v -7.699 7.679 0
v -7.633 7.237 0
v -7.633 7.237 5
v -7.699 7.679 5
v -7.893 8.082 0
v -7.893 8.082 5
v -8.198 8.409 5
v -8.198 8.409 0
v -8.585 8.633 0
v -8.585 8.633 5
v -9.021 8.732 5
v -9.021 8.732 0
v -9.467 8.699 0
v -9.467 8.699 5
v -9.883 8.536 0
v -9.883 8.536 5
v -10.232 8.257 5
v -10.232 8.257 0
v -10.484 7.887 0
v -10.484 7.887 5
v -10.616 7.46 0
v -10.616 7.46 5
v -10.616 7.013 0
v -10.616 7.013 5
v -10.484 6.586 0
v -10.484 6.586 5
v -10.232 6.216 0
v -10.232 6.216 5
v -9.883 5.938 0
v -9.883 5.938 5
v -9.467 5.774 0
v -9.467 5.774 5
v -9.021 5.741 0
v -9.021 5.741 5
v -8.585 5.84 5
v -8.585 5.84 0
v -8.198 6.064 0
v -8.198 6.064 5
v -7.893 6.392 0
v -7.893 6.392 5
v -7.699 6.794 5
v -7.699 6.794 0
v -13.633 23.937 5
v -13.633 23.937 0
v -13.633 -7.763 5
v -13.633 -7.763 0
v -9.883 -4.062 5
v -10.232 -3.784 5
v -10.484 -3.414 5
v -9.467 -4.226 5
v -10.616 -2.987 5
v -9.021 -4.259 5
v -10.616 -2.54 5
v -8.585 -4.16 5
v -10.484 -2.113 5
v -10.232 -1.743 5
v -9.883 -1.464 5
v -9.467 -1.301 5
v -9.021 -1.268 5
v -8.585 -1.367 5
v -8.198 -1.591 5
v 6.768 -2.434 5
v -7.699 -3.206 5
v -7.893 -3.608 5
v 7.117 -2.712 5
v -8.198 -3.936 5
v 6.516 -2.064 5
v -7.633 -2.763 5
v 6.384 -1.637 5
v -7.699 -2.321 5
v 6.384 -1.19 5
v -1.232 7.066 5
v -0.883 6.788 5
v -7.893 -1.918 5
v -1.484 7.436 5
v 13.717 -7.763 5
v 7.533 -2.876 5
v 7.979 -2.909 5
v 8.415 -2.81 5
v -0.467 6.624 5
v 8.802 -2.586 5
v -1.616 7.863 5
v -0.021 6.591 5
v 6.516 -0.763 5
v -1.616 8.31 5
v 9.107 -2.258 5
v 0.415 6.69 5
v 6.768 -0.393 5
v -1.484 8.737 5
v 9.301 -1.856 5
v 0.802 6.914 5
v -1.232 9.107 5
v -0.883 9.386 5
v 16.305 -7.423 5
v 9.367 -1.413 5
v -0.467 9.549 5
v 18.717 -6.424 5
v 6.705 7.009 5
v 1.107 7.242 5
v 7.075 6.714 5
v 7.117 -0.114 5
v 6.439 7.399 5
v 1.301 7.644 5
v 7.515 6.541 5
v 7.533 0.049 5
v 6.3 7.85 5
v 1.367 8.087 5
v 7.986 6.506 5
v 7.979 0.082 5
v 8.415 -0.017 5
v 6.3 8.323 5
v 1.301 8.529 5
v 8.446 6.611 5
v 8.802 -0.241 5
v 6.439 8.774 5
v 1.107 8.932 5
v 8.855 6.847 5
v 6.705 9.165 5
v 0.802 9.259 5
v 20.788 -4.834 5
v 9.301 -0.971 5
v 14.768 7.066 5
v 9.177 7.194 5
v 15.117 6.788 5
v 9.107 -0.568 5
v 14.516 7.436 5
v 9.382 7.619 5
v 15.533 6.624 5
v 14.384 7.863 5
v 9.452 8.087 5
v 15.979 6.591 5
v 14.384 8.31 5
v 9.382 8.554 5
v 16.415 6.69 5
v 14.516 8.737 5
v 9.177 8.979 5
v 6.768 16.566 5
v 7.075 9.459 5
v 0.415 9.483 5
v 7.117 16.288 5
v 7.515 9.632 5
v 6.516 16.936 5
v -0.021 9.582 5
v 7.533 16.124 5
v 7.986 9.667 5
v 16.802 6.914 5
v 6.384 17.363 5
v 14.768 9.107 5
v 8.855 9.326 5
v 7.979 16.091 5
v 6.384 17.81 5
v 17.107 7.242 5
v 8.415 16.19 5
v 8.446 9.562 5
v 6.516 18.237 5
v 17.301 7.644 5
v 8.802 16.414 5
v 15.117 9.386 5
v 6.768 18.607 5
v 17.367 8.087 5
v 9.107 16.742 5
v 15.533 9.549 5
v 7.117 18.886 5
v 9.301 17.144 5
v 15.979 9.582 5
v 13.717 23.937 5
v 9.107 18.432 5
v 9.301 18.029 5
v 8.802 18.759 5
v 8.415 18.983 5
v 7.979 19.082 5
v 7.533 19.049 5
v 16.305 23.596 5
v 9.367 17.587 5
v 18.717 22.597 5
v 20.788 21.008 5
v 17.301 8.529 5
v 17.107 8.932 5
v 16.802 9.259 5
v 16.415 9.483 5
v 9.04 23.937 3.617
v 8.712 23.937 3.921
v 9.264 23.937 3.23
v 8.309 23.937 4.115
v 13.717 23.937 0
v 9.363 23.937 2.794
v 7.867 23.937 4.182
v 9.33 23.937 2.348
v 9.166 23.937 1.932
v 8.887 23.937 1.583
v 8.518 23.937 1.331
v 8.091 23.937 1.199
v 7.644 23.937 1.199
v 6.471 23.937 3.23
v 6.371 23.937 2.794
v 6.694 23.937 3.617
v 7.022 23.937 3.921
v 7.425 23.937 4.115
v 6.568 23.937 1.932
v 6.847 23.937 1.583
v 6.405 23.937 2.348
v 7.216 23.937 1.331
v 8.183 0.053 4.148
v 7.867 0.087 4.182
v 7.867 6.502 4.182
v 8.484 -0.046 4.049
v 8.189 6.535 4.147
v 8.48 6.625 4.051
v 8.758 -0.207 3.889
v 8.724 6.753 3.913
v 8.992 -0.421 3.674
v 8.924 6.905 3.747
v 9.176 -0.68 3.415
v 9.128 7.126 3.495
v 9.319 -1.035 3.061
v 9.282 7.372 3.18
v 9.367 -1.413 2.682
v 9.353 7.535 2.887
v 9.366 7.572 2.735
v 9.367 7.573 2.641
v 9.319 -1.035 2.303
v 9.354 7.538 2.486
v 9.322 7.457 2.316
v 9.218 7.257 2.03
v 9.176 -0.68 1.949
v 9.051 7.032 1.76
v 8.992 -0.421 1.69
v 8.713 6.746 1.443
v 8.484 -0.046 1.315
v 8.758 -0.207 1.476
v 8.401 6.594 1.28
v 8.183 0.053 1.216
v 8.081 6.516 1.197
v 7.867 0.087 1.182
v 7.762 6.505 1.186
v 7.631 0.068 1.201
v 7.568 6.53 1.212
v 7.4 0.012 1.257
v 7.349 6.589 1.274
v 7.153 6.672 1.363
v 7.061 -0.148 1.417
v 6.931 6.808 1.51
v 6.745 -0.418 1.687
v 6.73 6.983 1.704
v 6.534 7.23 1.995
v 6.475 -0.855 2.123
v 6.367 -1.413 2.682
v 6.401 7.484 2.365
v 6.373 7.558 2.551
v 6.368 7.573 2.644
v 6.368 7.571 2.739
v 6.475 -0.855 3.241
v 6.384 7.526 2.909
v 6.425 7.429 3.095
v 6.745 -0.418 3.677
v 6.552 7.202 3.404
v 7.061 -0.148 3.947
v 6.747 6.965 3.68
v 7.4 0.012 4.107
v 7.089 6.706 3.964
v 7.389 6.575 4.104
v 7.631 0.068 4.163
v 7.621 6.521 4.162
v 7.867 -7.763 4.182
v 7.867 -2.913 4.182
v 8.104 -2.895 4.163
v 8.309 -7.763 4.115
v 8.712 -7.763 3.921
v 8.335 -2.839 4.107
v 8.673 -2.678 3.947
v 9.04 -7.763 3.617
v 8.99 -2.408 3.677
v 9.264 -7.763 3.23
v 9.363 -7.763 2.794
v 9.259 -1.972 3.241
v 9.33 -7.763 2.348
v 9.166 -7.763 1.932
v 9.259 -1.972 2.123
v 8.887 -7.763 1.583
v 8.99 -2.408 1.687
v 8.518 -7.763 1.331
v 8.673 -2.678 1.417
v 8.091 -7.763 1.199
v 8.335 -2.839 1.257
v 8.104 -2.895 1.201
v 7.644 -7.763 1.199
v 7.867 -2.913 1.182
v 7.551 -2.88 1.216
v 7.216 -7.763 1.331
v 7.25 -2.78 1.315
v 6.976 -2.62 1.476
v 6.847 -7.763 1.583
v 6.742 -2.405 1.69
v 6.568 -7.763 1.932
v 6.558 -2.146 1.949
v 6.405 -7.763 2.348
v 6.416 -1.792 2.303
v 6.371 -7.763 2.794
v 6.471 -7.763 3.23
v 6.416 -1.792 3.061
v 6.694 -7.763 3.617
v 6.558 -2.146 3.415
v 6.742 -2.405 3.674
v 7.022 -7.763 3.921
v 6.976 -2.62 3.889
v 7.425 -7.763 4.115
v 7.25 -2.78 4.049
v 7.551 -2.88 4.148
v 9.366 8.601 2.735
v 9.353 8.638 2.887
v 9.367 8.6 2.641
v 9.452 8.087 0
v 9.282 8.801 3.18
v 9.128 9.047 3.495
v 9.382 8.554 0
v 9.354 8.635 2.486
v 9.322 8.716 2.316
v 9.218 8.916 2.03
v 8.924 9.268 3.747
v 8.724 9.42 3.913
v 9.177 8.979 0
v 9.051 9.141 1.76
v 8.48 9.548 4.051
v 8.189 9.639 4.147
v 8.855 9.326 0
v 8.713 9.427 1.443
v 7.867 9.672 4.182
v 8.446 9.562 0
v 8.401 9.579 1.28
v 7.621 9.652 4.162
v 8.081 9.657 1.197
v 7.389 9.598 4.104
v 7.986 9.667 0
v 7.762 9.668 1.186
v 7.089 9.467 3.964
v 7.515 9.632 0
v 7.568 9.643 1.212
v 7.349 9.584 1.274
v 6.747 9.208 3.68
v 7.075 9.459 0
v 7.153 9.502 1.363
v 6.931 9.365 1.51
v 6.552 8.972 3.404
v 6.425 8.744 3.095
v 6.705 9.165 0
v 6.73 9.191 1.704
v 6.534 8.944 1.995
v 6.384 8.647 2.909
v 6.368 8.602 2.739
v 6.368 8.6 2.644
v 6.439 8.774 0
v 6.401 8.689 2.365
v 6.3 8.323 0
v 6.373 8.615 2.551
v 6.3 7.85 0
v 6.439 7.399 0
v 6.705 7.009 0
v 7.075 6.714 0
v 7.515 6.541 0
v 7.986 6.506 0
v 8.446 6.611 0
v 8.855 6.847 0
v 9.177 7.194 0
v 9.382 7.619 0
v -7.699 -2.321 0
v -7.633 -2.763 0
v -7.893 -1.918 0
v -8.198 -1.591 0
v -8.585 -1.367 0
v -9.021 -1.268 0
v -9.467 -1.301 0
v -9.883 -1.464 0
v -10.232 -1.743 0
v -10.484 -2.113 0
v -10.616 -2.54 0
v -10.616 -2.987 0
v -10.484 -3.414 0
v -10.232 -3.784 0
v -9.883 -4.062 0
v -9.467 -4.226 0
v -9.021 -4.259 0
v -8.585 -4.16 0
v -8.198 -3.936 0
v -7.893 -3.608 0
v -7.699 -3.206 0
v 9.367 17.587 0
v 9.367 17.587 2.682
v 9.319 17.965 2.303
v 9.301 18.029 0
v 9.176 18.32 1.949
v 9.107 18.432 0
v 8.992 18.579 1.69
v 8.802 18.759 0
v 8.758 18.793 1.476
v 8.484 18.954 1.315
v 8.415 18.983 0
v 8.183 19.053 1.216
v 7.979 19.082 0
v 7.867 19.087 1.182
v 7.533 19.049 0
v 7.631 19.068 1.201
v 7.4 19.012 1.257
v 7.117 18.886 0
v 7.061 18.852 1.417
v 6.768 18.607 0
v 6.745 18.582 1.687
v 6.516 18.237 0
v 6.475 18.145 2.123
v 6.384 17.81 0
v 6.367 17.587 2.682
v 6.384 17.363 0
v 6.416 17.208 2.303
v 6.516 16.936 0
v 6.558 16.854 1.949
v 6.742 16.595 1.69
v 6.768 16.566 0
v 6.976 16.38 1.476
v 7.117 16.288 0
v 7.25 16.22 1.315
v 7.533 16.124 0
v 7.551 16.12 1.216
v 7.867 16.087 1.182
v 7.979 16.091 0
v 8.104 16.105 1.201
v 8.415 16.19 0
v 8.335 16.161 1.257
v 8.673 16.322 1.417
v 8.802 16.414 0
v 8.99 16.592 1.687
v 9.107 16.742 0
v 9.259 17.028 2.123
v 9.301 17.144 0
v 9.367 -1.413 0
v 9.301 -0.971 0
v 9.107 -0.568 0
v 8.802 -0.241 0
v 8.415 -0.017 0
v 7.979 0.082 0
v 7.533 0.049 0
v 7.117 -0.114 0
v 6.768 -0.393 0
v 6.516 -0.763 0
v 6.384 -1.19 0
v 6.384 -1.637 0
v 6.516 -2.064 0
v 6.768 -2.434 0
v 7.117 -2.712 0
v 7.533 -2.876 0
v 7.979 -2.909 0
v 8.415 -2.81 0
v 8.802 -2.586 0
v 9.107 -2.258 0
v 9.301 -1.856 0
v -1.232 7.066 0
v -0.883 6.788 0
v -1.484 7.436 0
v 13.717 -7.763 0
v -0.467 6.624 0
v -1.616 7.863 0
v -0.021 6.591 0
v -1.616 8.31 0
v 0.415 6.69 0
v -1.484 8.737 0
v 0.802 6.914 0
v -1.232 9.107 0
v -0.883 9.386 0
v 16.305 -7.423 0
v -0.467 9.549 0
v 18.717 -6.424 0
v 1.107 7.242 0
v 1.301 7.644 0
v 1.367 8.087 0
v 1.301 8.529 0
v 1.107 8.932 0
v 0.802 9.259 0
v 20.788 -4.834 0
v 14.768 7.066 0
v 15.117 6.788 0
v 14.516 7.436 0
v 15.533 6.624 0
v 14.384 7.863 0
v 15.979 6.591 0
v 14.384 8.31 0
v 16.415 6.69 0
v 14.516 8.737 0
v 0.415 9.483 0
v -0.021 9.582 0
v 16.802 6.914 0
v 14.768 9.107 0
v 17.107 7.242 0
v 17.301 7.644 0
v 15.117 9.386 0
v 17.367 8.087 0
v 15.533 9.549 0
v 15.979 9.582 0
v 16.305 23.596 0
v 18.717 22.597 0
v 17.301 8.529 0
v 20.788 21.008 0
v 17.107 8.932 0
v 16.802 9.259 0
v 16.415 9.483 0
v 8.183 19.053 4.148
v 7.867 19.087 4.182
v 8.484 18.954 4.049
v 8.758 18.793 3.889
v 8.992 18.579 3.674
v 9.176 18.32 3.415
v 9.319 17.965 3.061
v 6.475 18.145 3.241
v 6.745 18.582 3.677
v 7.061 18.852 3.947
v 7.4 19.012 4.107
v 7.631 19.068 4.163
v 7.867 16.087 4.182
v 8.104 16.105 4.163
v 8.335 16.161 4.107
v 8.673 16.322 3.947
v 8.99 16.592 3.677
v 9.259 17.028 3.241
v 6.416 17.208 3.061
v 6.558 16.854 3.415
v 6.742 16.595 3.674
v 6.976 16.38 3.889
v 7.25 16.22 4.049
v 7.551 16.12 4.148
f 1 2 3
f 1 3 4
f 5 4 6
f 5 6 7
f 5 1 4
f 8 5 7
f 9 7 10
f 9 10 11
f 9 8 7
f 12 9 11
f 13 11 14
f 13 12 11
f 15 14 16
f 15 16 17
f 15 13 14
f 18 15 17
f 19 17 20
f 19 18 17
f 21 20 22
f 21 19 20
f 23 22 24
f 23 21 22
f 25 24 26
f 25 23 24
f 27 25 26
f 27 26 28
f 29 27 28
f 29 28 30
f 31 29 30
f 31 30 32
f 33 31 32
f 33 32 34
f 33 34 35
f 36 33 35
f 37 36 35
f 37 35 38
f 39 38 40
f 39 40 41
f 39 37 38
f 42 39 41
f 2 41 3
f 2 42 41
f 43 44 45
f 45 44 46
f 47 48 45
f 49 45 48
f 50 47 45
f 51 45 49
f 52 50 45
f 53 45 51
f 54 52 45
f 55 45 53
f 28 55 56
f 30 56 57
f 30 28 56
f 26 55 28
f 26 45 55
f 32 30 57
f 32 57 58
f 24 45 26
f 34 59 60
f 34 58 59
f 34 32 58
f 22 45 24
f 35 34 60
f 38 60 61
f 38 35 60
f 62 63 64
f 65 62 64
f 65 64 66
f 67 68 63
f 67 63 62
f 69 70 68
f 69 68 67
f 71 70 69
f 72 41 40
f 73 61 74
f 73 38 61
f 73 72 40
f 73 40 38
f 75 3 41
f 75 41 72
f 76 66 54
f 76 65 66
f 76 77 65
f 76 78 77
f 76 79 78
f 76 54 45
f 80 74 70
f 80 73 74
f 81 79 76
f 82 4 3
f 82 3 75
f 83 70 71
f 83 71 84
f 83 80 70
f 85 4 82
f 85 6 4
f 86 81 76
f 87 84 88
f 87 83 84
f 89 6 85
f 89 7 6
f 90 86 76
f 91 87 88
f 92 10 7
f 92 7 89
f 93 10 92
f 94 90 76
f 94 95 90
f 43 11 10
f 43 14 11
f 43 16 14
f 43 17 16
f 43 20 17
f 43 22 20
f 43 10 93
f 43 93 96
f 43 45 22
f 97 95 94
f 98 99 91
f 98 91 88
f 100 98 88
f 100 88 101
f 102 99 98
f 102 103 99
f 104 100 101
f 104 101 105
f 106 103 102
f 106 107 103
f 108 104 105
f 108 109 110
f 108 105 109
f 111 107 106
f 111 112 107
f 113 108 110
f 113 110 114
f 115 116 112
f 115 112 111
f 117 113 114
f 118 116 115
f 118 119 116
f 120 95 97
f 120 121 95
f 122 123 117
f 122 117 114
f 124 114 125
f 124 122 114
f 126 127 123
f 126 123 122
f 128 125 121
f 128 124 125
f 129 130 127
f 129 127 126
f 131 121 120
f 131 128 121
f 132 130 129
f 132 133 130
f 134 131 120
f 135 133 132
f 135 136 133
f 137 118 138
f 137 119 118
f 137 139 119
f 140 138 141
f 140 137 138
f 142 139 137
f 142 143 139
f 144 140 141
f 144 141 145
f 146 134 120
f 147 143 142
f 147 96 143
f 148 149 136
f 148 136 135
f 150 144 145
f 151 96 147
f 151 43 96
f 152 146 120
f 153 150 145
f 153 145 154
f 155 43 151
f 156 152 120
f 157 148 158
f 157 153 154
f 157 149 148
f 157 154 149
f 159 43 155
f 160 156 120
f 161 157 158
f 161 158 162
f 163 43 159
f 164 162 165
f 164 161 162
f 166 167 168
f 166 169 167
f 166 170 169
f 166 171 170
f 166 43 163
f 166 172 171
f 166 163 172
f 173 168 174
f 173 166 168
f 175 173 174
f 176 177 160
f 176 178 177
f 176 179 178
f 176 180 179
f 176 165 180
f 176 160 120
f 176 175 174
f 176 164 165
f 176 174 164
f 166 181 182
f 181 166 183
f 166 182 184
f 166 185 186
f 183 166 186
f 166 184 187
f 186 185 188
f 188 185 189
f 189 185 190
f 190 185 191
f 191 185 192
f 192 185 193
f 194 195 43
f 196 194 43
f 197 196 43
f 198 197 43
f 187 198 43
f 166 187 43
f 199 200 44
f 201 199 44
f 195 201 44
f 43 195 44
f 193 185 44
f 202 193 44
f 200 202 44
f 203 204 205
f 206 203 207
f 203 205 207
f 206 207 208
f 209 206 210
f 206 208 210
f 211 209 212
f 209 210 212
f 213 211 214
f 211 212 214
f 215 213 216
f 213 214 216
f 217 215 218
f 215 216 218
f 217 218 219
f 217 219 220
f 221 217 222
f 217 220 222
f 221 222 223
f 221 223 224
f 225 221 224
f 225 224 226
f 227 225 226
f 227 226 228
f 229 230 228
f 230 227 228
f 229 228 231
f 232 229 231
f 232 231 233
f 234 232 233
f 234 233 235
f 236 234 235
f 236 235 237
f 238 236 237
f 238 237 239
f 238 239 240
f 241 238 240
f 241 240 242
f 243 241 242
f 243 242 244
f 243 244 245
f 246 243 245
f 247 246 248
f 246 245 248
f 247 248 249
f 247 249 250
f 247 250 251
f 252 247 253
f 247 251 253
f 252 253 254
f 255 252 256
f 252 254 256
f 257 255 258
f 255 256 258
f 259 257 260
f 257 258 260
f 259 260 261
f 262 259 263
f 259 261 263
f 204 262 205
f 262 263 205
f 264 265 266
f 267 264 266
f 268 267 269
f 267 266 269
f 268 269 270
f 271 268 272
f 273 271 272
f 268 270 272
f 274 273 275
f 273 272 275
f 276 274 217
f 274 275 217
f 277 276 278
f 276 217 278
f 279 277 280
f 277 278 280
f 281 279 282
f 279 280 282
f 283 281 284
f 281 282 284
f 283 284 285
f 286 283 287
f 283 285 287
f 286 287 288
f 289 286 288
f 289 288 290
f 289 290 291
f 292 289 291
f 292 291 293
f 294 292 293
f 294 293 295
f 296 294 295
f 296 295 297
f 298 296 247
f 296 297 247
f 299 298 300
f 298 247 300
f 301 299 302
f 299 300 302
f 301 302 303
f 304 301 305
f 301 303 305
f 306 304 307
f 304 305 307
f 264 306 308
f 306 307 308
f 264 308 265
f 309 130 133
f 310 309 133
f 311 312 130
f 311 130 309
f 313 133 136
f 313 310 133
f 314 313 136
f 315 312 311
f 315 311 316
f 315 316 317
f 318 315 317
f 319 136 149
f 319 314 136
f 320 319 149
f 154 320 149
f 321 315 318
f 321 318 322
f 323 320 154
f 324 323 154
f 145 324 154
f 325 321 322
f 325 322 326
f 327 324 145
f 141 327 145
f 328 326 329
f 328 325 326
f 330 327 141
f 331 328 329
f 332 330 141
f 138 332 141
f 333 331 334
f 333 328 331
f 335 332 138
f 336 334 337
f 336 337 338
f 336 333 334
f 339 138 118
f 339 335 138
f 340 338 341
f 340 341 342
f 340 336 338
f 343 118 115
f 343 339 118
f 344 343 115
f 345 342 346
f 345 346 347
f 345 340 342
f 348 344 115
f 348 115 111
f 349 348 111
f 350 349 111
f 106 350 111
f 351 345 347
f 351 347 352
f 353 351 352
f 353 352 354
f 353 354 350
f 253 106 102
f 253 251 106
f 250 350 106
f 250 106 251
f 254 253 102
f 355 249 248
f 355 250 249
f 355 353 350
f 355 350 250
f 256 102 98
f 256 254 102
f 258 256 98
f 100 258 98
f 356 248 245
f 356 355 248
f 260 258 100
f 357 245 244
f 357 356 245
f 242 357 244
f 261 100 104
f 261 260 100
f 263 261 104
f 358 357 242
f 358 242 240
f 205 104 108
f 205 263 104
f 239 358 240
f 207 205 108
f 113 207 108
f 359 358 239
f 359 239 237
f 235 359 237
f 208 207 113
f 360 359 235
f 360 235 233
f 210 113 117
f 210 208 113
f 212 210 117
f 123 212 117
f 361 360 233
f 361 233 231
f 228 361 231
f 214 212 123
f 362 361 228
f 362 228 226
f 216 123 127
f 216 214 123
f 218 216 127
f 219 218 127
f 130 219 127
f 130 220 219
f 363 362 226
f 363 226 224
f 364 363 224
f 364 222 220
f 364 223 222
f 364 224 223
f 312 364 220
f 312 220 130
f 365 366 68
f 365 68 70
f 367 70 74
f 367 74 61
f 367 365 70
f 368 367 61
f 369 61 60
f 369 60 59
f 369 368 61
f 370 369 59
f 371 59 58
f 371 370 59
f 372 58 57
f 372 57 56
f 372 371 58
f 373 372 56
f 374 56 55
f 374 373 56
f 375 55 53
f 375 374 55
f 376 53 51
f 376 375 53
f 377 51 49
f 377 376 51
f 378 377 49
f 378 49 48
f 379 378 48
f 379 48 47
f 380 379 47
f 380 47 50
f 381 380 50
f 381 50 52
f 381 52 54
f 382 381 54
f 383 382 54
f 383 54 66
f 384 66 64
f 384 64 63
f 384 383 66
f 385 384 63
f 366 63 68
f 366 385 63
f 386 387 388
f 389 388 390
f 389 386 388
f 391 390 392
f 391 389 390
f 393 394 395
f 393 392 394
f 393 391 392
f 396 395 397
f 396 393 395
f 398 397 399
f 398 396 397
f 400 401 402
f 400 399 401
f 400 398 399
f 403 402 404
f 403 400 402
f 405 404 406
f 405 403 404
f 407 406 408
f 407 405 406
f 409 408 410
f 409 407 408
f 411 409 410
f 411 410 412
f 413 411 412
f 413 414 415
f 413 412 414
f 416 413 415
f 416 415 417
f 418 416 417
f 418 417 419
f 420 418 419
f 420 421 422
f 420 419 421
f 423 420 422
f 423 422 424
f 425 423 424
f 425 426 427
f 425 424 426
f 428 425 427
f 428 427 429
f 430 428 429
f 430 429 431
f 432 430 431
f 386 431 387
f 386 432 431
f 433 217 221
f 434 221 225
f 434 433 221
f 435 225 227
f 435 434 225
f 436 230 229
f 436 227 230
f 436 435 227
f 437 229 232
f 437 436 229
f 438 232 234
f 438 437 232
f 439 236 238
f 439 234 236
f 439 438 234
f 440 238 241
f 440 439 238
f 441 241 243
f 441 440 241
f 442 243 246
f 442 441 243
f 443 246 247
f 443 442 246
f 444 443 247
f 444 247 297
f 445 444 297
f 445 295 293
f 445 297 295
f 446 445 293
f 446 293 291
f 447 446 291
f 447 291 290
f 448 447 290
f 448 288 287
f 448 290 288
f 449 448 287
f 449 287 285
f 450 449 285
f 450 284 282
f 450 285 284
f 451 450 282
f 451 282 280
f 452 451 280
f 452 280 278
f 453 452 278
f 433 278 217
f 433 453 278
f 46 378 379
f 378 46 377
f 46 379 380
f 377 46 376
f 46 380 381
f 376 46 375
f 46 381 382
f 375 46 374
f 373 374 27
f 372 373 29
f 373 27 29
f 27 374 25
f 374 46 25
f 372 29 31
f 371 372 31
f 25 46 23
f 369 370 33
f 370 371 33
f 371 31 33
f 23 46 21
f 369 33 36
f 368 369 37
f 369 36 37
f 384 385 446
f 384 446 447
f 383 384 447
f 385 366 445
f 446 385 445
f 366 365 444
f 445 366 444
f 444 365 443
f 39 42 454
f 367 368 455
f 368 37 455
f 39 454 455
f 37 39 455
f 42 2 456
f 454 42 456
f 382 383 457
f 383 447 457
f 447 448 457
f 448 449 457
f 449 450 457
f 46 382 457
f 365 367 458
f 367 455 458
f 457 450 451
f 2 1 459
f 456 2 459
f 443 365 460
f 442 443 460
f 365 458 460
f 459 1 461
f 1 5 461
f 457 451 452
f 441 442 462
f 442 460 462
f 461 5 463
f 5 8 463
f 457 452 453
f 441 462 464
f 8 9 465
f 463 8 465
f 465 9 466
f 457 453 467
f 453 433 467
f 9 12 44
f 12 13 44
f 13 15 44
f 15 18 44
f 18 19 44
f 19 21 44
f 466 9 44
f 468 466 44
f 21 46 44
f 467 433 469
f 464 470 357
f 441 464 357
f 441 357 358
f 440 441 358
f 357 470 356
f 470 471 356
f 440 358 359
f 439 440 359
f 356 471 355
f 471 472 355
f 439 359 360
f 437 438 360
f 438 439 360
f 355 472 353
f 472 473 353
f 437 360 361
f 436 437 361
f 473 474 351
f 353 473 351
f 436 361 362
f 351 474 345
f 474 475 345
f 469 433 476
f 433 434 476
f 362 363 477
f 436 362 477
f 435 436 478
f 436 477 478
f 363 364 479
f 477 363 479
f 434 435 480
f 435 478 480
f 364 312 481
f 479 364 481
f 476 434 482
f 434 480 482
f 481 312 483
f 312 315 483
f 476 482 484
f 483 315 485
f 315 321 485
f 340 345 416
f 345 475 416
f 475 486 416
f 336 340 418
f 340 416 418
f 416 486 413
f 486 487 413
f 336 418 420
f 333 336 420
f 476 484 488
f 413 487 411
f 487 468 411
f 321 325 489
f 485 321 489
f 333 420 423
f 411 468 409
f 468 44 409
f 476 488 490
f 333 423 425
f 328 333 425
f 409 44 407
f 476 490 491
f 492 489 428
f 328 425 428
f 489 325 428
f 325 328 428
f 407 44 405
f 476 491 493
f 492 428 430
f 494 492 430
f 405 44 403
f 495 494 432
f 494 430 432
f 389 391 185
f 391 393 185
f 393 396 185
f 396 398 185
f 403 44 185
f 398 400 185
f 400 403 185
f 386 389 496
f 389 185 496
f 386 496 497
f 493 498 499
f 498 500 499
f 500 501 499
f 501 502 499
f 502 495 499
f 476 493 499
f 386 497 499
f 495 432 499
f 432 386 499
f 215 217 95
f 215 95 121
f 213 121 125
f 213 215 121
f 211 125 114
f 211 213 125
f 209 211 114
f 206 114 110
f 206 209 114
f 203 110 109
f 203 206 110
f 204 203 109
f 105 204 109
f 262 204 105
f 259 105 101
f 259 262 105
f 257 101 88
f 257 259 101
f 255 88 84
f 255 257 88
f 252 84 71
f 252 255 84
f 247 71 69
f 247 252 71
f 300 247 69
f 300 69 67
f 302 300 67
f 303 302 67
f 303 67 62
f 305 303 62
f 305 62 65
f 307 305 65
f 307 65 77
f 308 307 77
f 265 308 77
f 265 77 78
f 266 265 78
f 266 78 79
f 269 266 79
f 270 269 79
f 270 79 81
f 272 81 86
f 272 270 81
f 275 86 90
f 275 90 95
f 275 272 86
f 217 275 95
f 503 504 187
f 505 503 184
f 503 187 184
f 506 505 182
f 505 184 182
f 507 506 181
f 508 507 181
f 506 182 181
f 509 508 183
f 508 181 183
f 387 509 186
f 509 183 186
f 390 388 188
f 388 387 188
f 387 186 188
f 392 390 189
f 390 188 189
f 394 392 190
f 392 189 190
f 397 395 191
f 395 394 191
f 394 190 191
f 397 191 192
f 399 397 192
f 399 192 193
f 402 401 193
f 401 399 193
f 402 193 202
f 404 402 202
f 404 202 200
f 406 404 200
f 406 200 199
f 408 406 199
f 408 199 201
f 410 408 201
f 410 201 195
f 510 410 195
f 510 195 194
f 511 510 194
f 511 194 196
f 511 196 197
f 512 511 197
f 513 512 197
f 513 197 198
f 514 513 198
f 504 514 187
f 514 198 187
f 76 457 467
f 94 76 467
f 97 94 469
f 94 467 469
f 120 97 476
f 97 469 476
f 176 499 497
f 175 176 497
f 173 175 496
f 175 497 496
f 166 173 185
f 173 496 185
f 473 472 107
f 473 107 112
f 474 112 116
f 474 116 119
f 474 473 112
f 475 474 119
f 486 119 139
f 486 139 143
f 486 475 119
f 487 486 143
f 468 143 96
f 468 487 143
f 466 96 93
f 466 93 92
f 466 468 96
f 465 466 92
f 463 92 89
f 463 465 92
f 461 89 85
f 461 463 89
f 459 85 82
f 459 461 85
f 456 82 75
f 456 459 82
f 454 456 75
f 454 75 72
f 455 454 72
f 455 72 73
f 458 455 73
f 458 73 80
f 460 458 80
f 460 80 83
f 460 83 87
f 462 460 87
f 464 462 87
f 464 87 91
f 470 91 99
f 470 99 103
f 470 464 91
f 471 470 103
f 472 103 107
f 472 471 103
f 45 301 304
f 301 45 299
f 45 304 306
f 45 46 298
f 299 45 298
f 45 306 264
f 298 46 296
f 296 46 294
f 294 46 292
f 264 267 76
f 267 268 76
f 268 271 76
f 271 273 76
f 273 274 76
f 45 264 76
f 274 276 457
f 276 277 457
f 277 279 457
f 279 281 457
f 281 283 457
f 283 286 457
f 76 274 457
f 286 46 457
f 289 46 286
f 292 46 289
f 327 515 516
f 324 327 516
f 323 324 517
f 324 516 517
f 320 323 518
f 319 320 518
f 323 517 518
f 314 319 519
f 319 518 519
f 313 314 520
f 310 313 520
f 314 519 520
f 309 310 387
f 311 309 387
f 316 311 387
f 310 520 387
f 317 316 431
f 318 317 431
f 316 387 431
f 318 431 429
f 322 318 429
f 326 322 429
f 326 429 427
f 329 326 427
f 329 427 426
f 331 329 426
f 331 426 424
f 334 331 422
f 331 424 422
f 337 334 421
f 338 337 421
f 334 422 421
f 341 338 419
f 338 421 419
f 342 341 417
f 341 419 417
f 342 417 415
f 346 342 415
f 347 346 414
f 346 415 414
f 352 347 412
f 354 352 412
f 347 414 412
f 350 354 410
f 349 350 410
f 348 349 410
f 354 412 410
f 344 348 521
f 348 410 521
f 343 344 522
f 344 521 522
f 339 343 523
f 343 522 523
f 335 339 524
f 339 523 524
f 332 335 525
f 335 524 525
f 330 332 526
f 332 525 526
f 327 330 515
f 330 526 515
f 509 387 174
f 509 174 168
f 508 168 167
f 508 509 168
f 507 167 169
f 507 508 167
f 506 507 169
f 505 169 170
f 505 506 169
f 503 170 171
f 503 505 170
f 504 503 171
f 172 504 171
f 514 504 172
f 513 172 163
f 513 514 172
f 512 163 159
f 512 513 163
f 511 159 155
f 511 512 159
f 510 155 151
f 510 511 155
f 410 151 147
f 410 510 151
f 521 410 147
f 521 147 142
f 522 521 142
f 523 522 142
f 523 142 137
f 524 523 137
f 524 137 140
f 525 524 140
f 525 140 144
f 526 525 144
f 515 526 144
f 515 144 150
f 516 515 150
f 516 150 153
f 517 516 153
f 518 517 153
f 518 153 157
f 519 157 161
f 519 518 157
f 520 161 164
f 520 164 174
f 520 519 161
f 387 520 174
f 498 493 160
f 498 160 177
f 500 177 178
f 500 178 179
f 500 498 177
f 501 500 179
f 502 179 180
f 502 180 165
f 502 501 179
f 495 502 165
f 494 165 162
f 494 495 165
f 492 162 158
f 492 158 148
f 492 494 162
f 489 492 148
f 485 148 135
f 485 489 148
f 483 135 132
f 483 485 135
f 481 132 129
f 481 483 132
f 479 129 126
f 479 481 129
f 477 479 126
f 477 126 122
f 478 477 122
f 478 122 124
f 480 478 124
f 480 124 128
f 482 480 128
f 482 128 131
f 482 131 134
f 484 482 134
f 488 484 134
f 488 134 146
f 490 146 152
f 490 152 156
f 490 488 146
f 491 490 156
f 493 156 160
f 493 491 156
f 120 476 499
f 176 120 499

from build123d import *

# Parameters (mm, degrees)
CROQUIS1_R              = 1.585
CROQUIS1_R_2            = 1.5
SALIENTE_EXTRUIR1_DEPTH = 5
CROQUIS2_R              = 1.5
CORTAR_EXTRUIR1_DEPTH   = 35


with BuildPart() as part:
    # Croquis1 → Saliente-Extruir1 (new body)
    with BuildSketch(Plane.XY):
        with BuildLine():
            Line((-13.632801604, 23.936623068), (-13.632801604, 2.936623068))
            Line((-13.632801604, 2.936623068), (-13.632801604, -7.763376932))
            Line((-13.632801604, -7.763376932), (13.717198396, -7.763376932))
            ThreePointArc((13.717198396, -7.763376932), (17.54403272, -7.002172257), (20.788266208, -4.834444744))
            Line((20.788266208, -4.834444744), (20.788266208, 21.00769088))
            ThreePointArc((20.788266208, 21.00769088), (17.54403272, 23.175418393), (13.717198396, 23.936623068))
            Line((13.717198396, 23.936623068), (-13.632801604, 23.936623068))
        make_face()
        with Locations((7.867198396, 8.086623068)):
            Circle(CROQUIS1_R, mode=Mode.SUBTRACT)
        with Locations((-0.132801604, 8.086623068)):
            Circle(CROQUIS1_R_2, mode=Mode.SUBTRACT)
        with Locations((7.867198396, -1.413376932)):
            Circle(CROQUIS1_R_2, mode=Mode.SUBTRACT)
        with Locations((15.867198396, 8.086623068)):
            Circle(CROQUIS1_R_2, mode=Mode.SUBTRACT)
        with Locations((7.867198396, 17.586623068)):
            Circle(CROQUIS1_R_2, mode=Mode.SUBTRACT)
        with Locations((-9.132801604, 7.236623068)):
            Circle(CROQUIS1_R_2, mode=Mode.SUBTRACT)
        with Locations((-9.132801604, -2.763376932)):
            Circle(CROQUIS1_R_2, mode=Mode.SUBTRACT)
    extrude(amount=SALIENTE_EXTRUIR1_DEPTH)

    # Croquis2 → Cortar-Extruir1 (cut)
    with BuildSketch(Plane(origin=(0, 23.936623068, 0), x_dir=(1, 0, 0), z_dir=(0, 1, 0))):
        with Locations(Location((7.867198396, -2.682084827, 0), (0, 0, 270))):
            Circle(CROQUIS2_R)
    extrude(amount=-CORTAR_EXTRUIR1_DEPTH, mode=Mode.SUBTRACT)


solid = part.part
